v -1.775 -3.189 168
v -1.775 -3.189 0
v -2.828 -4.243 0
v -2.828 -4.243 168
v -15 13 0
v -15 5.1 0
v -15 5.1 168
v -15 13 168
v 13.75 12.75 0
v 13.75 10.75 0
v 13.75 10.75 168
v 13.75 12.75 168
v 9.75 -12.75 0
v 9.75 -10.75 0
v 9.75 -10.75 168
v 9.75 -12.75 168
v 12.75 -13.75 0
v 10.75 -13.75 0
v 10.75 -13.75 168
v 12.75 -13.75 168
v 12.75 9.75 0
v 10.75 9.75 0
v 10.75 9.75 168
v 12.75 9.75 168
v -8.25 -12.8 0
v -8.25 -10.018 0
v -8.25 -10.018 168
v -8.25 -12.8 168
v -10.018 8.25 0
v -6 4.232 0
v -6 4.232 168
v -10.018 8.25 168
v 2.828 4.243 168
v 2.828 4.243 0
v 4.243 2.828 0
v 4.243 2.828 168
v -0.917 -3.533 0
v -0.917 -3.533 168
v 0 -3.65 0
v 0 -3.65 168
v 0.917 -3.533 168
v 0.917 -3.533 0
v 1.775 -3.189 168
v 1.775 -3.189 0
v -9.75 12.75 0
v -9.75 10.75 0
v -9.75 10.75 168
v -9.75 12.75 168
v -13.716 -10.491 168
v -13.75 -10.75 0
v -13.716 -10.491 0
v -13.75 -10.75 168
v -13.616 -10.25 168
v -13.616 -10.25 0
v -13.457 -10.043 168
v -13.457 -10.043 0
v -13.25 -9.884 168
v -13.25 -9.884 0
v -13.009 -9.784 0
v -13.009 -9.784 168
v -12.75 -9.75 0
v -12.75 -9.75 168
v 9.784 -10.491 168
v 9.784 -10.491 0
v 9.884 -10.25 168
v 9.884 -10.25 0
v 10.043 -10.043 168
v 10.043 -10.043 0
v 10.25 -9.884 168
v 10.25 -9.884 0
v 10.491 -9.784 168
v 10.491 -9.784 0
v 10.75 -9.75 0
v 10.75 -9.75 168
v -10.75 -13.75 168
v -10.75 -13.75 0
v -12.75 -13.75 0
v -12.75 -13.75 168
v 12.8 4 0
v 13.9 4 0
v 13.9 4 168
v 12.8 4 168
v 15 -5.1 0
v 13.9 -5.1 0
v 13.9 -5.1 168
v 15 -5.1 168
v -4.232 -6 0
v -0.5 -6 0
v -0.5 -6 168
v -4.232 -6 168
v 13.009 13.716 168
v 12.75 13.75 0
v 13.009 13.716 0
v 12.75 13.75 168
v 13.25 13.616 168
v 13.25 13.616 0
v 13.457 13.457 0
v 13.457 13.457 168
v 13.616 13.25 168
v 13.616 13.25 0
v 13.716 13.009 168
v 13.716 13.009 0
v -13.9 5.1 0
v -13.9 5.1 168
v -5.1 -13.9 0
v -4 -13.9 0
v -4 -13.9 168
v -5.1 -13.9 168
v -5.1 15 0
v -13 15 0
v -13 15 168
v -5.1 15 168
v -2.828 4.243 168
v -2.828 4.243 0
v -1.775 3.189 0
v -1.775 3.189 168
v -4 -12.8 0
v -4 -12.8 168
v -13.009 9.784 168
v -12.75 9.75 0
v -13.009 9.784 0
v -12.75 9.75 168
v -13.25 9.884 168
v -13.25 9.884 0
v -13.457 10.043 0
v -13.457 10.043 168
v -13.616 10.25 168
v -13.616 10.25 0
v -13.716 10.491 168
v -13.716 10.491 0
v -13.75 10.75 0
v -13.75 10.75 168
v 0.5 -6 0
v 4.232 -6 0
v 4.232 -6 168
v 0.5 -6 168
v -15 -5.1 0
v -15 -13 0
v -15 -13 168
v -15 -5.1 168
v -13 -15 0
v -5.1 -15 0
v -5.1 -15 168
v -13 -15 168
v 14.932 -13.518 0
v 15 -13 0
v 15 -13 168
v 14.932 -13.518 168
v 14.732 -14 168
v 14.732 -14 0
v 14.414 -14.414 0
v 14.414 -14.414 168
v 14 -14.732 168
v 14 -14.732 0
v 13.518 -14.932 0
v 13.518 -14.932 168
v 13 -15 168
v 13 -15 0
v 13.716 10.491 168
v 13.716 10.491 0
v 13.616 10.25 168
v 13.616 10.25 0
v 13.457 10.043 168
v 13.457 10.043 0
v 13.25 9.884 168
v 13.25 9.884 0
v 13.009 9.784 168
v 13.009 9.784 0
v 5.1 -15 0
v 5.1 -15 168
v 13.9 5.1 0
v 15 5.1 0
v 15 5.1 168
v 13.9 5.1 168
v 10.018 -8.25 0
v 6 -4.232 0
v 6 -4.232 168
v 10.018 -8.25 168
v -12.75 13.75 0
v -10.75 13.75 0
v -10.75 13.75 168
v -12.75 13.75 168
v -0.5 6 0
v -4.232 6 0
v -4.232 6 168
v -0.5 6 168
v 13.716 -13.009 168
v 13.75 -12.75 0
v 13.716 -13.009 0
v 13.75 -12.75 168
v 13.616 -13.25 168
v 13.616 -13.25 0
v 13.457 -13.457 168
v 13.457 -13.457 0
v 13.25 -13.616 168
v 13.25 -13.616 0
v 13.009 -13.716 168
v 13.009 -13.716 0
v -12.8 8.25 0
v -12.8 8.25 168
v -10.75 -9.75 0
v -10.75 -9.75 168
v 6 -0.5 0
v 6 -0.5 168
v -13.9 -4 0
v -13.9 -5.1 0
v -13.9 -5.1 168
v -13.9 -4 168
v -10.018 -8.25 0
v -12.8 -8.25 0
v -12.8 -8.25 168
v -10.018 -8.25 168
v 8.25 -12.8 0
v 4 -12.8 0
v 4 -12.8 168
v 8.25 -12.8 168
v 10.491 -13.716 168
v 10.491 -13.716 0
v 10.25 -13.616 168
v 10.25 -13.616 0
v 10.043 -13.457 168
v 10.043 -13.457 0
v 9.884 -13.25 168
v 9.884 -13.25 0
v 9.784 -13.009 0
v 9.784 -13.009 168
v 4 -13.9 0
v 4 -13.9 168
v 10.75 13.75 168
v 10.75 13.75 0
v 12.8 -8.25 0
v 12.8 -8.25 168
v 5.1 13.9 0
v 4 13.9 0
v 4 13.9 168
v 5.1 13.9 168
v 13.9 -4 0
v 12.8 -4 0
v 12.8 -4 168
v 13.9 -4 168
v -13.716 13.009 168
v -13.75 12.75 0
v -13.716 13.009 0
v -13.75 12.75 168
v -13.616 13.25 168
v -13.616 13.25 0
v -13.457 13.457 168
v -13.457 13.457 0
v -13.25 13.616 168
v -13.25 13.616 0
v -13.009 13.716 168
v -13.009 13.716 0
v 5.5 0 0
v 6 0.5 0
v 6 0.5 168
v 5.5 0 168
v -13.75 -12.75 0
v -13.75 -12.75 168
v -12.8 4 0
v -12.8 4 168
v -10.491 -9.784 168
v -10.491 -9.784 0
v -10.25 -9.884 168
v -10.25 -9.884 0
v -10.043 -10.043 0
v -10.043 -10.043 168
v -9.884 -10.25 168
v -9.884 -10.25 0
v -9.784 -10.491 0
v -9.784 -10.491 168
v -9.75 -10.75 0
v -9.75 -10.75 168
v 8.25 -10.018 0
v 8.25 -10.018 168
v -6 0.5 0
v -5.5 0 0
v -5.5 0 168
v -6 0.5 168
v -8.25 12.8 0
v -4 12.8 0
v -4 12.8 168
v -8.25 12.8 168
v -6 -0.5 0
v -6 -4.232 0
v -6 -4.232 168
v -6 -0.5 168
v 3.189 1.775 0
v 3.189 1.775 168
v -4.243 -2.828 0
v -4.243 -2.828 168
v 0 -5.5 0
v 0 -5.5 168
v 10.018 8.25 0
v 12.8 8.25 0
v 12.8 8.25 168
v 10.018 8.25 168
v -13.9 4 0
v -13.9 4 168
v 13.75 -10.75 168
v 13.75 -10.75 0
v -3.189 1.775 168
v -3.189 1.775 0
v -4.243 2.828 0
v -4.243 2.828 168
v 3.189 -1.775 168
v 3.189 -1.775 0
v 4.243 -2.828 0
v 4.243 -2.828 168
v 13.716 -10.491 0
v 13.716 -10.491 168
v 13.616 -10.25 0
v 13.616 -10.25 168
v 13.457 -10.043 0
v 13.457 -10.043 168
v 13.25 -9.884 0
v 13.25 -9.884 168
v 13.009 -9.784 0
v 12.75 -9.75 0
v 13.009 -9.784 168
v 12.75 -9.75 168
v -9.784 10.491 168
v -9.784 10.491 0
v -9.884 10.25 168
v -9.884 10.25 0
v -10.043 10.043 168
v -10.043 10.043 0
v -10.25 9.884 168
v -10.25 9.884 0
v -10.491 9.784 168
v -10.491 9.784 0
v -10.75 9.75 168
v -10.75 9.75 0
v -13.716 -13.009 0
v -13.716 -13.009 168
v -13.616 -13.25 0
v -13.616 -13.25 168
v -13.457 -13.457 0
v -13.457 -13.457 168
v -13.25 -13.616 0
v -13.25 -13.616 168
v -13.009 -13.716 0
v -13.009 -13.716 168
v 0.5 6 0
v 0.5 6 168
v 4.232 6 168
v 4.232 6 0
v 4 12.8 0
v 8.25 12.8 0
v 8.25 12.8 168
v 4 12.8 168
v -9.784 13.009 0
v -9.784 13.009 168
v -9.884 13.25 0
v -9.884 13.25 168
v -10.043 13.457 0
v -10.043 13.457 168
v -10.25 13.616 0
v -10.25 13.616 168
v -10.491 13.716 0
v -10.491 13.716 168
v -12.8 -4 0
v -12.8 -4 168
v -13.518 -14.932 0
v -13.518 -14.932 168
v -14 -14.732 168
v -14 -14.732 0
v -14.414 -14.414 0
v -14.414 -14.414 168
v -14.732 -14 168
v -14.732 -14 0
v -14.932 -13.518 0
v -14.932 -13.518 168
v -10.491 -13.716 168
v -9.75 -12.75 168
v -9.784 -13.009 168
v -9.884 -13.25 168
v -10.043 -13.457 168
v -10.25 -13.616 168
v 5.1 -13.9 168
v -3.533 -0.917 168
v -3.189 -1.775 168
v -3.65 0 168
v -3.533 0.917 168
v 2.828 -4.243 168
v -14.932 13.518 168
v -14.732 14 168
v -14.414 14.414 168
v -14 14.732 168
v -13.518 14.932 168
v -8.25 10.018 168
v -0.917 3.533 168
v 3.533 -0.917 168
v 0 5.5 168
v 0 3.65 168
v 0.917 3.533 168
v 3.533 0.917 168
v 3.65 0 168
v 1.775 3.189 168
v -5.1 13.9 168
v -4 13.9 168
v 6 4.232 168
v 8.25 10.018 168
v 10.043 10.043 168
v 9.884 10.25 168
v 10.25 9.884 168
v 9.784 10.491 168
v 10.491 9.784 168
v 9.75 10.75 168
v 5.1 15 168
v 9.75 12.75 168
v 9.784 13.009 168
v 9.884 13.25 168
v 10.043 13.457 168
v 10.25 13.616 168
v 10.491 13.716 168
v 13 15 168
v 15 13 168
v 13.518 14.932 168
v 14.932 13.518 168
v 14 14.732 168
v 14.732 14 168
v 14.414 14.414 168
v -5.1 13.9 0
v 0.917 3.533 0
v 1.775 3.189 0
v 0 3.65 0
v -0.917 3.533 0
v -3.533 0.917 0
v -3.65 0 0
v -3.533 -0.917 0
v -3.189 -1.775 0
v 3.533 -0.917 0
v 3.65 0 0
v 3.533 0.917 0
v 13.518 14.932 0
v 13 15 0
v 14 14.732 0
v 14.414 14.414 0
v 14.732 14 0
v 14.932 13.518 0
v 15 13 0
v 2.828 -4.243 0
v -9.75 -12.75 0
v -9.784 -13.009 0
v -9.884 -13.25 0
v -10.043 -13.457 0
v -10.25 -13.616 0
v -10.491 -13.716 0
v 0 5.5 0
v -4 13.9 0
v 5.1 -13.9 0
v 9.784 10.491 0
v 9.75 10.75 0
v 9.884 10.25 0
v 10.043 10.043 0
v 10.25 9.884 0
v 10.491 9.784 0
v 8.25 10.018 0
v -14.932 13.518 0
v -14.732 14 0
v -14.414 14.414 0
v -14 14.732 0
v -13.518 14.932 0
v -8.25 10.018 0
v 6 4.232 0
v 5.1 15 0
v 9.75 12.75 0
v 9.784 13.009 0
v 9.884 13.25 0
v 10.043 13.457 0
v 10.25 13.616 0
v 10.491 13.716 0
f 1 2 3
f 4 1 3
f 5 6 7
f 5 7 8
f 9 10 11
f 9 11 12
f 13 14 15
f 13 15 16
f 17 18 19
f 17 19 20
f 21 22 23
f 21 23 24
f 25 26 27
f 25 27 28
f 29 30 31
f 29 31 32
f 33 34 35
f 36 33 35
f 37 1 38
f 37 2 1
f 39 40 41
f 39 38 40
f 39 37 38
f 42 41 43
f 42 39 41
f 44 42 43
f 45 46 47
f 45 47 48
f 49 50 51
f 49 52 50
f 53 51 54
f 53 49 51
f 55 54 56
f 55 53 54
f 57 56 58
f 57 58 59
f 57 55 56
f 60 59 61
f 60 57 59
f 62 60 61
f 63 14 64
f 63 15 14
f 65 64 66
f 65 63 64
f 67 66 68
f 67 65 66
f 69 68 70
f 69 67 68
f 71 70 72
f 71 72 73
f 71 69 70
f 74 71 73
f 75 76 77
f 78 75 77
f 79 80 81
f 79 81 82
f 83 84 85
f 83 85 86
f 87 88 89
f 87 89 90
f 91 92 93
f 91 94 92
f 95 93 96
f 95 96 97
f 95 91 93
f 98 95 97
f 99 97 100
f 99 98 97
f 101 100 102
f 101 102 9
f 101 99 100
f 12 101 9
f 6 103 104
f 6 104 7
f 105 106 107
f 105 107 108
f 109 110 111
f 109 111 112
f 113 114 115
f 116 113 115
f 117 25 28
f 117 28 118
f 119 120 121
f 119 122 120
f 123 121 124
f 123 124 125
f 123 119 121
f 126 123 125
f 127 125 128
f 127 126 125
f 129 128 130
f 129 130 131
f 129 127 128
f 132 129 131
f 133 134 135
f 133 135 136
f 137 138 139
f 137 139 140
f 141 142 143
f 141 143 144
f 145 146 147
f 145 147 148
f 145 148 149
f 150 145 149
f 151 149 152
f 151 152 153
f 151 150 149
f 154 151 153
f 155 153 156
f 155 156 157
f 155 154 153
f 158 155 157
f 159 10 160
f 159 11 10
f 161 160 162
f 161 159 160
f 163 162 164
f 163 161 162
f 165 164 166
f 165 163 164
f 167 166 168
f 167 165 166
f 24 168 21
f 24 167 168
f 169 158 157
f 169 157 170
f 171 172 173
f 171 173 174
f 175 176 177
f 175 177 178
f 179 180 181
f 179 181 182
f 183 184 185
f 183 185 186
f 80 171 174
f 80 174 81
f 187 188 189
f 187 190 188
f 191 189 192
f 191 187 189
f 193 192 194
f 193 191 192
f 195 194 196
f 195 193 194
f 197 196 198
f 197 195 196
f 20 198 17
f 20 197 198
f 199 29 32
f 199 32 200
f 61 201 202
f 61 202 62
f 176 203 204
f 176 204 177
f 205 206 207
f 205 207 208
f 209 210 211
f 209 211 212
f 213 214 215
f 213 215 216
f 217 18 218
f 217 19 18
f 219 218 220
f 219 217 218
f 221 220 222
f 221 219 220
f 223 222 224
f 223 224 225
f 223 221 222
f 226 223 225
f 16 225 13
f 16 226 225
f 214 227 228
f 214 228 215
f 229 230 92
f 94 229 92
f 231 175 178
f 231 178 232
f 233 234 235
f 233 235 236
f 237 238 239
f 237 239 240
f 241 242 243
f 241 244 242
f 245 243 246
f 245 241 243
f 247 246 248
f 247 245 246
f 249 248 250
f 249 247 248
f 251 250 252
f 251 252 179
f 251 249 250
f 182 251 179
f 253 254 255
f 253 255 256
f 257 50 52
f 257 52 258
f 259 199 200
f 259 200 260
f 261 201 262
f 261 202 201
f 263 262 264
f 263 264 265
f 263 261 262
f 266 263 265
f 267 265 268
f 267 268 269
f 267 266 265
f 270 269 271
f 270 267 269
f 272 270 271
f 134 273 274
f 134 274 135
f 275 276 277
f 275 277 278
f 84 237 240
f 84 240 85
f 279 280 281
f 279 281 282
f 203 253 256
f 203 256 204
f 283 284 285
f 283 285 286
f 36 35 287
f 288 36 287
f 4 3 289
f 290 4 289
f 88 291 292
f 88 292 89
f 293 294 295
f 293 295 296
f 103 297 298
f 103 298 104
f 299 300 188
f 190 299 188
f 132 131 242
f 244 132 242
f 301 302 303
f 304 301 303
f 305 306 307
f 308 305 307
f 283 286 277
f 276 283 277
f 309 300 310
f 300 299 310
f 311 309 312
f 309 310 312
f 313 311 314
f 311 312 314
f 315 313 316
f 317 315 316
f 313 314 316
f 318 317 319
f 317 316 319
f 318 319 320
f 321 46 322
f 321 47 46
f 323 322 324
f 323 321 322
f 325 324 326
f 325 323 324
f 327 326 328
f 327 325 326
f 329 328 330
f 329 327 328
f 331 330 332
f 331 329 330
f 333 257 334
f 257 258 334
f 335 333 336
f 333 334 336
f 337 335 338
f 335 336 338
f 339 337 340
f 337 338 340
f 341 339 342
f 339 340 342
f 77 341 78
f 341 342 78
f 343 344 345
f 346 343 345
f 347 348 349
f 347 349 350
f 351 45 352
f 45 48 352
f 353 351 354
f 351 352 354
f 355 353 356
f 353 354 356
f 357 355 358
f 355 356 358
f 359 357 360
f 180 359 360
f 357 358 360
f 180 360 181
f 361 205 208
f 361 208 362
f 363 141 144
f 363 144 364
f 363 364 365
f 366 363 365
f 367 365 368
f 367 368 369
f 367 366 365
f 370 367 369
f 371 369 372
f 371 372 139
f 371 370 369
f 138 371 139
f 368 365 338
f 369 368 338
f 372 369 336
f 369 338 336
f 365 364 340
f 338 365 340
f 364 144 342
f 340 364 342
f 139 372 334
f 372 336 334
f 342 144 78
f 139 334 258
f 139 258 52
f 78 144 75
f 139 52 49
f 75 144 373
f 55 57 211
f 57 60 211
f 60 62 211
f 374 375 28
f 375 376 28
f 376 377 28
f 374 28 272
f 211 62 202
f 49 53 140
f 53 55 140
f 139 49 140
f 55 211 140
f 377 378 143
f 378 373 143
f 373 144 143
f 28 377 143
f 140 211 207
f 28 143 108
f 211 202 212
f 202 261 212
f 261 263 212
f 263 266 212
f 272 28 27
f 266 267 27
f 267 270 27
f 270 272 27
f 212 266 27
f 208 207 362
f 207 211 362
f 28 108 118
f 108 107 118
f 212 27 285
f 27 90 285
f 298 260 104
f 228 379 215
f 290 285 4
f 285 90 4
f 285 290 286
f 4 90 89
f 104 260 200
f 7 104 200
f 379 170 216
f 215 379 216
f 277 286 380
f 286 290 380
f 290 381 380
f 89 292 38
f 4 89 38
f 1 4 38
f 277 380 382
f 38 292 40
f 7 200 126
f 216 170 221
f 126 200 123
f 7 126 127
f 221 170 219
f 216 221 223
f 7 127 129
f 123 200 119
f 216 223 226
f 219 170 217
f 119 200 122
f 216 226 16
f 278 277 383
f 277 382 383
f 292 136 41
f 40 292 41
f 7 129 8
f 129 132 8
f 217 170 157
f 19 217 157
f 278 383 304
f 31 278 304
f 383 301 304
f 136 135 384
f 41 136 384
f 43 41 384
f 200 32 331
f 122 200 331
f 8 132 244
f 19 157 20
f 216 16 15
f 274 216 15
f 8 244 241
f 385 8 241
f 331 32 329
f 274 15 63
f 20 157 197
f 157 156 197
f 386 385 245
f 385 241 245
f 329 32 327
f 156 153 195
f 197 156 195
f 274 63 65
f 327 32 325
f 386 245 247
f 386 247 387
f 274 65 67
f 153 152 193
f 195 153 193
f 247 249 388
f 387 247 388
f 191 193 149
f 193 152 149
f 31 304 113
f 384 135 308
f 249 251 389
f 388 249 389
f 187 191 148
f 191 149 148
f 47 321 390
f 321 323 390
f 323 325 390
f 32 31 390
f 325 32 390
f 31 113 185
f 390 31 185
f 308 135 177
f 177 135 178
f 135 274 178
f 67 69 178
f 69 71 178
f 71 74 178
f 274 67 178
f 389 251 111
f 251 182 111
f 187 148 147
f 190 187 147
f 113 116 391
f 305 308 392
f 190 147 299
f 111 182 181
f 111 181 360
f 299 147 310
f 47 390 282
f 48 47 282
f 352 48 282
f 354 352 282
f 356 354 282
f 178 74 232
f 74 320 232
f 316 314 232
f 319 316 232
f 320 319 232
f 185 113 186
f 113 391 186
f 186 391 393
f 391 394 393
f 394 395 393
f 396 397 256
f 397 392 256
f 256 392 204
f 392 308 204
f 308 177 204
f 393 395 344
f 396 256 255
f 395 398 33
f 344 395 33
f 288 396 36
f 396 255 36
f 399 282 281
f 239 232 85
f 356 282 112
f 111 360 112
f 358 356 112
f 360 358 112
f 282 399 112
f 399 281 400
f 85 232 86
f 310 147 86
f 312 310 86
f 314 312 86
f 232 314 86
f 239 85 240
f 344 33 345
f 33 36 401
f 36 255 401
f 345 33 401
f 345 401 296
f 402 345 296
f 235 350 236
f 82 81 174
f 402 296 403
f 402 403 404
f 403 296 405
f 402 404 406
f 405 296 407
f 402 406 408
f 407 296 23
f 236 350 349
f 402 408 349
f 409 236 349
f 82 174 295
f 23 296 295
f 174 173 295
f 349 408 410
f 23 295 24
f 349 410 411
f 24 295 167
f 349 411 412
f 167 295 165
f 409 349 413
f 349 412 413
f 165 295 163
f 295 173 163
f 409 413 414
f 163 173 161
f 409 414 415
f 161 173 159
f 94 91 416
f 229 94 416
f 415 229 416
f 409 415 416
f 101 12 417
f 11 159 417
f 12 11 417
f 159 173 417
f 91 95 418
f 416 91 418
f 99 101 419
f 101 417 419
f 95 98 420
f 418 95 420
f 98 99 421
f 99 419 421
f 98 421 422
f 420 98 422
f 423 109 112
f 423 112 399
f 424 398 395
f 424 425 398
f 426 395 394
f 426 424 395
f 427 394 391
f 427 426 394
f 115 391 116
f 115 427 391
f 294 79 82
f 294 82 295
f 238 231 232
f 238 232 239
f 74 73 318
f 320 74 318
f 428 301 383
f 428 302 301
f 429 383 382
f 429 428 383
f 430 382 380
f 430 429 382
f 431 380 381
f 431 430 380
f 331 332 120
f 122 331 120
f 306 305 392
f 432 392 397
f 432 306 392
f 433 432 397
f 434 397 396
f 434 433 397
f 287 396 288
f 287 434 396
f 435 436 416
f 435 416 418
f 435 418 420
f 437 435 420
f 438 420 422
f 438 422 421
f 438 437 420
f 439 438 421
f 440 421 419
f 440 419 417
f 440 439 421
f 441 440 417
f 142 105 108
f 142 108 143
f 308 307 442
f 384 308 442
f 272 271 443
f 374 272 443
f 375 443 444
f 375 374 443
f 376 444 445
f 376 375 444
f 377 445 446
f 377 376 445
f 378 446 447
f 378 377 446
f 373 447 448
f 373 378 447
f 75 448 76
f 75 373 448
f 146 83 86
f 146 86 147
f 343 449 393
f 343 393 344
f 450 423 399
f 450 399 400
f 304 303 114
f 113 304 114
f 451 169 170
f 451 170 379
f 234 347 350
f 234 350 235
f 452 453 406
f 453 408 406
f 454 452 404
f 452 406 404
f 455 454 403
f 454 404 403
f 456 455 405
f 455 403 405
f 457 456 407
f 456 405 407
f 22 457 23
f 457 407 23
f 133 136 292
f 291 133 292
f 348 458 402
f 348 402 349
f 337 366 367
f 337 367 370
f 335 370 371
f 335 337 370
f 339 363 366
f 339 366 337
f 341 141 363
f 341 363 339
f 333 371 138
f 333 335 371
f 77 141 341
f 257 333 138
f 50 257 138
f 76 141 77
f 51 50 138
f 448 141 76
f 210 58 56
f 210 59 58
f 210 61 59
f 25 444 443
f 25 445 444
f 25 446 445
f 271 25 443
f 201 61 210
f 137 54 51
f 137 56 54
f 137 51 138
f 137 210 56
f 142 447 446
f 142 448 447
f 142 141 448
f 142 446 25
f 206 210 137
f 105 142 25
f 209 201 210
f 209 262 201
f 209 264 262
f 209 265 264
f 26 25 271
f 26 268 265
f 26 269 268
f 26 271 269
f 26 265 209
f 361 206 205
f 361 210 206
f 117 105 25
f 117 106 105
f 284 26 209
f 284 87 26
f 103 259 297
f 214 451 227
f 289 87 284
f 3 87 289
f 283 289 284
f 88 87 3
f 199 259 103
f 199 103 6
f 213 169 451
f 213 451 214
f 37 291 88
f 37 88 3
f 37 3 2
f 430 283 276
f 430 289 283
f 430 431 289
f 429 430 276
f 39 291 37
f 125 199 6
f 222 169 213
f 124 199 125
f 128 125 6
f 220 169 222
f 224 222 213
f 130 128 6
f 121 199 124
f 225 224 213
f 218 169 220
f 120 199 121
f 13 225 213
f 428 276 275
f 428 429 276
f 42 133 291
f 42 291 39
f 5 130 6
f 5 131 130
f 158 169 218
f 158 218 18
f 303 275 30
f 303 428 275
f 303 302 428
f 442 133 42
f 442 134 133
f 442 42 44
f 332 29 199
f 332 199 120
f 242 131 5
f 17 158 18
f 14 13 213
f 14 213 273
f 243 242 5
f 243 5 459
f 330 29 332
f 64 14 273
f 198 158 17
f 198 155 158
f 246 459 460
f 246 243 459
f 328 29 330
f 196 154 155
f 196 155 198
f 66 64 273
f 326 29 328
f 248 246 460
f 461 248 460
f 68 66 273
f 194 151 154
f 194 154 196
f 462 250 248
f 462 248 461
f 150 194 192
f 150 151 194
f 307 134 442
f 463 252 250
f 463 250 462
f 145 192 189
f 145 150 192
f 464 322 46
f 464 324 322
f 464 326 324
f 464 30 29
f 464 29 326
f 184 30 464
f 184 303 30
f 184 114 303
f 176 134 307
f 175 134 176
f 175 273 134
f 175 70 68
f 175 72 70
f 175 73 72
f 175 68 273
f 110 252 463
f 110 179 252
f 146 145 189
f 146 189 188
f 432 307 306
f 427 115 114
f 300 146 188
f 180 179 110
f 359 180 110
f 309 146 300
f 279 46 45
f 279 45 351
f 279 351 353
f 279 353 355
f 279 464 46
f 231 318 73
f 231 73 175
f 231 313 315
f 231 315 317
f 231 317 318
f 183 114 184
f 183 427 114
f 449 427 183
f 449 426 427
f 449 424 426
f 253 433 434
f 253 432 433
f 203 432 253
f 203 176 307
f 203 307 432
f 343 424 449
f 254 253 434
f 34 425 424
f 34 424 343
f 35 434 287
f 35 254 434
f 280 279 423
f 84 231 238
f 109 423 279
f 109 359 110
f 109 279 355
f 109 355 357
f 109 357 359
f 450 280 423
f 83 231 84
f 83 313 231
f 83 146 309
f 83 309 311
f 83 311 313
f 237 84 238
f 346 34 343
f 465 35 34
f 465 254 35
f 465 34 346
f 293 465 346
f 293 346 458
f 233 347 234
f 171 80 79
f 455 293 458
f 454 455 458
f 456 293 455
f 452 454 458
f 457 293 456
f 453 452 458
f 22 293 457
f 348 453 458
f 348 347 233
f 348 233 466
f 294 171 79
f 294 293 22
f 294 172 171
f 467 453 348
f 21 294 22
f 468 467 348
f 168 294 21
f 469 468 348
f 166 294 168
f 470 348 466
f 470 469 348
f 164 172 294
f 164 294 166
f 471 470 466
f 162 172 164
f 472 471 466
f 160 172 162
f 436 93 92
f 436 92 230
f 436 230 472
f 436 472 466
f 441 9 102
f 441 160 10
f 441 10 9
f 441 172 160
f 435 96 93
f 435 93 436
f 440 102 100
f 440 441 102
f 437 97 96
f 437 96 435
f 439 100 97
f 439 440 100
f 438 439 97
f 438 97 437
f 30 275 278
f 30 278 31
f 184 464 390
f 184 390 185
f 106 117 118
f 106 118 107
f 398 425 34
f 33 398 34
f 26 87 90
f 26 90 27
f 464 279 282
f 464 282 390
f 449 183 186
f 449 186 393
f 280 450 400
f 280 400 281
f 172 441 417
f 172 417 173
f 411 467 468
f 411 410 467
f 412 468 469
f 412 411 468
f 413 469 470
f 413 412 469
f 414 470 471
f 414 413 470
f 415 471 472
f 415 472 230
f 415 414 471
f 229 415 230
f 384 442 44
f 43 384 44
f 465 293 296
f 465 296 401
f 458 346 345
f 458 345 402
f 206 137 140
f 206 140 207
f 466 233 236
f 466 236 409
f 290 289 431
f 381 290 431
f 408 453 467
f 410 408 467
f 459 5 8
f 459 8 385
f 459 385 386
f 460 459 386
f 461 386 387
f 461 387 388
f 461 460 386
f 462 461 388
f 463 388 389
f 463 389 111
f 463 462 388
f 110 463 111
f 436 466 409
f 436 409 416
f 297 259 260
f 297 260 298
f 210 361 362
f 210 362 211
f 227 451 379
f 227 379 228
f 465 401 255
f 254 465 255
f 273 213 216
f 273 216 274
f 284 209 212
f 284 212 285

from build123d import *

# Parameters (mm, degrees)
SKETCH1_R                = 3.65
SKETCH1_W                = 4
SKETCH1_H                = 4
BOSS_EXTRUDE1_DEPTH      = 168
FILLET1_R                = 1
CIRPATTERN1_COUNT        = 4
FILLET1_OF_CIRPATTERN1_R = 1
CUT_EXTRUDE1_DEPTH       = 170.3339895
CUT_EXTRUDE2_DEPTH       = 170.3339895
CIRPATTERN2_COUNT        = 4


with BuildPart() as part:
    # Sketch1 → Boss-Extrude1 (new body)
    with BuildSketch(Plane.XY):
        with BuildLine():
            Line((5.1, 15), (13, 15))
            ThreePointArc((13, 15), (14.414213562, 14.414213562), (15, 13))
            Line((15, 13), (15, 5.1))
            Line((15, 5.1), (13.9, 5.1))
            Line((13.9, 5.1), (13.9, 4))
            Line((13.9, 4), (12.8, 4))
            Line((12.8, 4), (12.8, 8.25))
            Line((12.8, 8.25), (10.017766953, 8.25))
            Line((10.017766953, 8.25), (6, 4.232233047))
            Line((6, 4.232233047), (6, -6))
            Line((6, -6), (-6, -6))
            Line((-6, -6), (-6, 6))
            Line((-6, 6), (4.232233047, 6))
            Line((4.232233047, 6), (8.25, 10.017766953))
            Line((8.25, 10.017766953), (8.25, 12.8))
            Line((8.25, 12.8), (4, 12.8))
            Line((4, 12.8), (4, 13.9))
            Line((4, 13.9), (5.1, 13.9))
            Line((5.1, 13.9), (5.1, 15))
        make_face()
        with Locations(Location((0, 0, 0), (0, 0, 180))):
            Circle(SKETCH1_R, mode=Mode.SUBTRACT)
        with Locations((11.75, 11.75)):
            Rectangle(SKETCH1_W, SKETCH1_H, mode=Mode.SUBTRACT)
    boss_extrude1 = extrude(amount=BOSS_EXTRUDE1_DEPTH)

    # Fillet1
    fillet1_edges = [part.edges().sort_by_distance(p)[0] for p in [
        (9.75, 13.75, 84),
        (9.75, 9.75, 84),
        (13.75, 9.75, 84),
        (13.75, 13.75, 84),
    ]]
    fillet(fillet1_edges, radius=FILLET1_R)

    # CirPattern1: Boss-Extrude1 ×4 about axis
    cirpattern1_axis = Axis((0, 0, 0), (0, 0, 1))
    for i in range(1, CIRPATTERN1_COUNT):
        add(boss_extrude1.rotate(cirpattern1_axis, i * 360 / CIRPATTERN1_COUNT))

    # Fillet1 of CirPattern1
    fillet1_of_cirpattern1_edges = [part.edges().sort_by_distance(p)[0] for p in [
        (-13.75, 9.75, 84),
        (-9.75, 9.75, 84),
        (-9.75, 13.75, 84),
        (-13.75, 13.75, 84),
        (-9.75, -13.75, 84),
        (-9.75, -9.75, 84),
        (-13.75, -9.75, 84),
        (-13.75, -13.75, 84),
        (13.75, -9.75, 84),
        (9.75, -9.75, 84),
        (9.75, -13.75, 84),
        (13.75, -13.75, 84),
    ]]
    fillet(fillet1_of_cirpattern1_edges, radius=FILLET1_OF_CIRPATTERN1_R)

    # Sketch2 → Cut-Extrude1 (cut, through all)
    with BuildSketch(Plane(origin=(0, 0, 0), x_dir=(-1, 0, 0), z_dir=(0, 0, -1))):
        Polygon((0, 5.5), (-0.5, 6), (0.5, 6), align=None)
    cut_extrude1 = extrude(amount=-CUT_EXTRUDE1_DEPTH, mode=Mode.SUBTRACT)

    # Sketch3 → Cut-Extrude2 (cut, through all)
    with BuildSketch(Plane(origin=(0, 0, 0), x_dir=(-1, 0, 0), z_dir=(0, 0, -1))):
        with BuildLine():
            Line((-1.775079755, 3.189293317), (-2.828427125, 4.242640687))
            Line((-2.828427125, 4.242640687), (-4.242640687, 2.828427125))
            Line((-4.242640687, 2.828427125), (-3.189293317, 1.775079755))
            ThreePointArc((-3.189293317, 1.775079755), (-2.580939751, 2.580939751), (-1.775079755, 3.189293317))
        make_face()
    cut_extrude2 = extrude(amount=-CUT_EXTRUDE2_DEPTH, mode=Mode.SUBTRACT)

    # CirPattern2: Cut-Extrude1, Cut-Extrude2 ×4 about axis
    cirpattern2_axis = Axis((0, 0, 0), (0, 0, 1))
    add([cut_extrude1.rotate(cirpattern2_axis, i * 360 / CIRPATTERN2_COUNT) for i in range(1, CIRPATTERN2_COUNT)], mode=Mode.SUBTRACT)
    add([cut_extrude2.rotate(cirpattern2_axis, i * 360 / CIRPATTERN2_COUNT) for i in range(1, CIRPATTERN2_COUNT)], mode=Mode.SUBTRACT)


solid = part.part
